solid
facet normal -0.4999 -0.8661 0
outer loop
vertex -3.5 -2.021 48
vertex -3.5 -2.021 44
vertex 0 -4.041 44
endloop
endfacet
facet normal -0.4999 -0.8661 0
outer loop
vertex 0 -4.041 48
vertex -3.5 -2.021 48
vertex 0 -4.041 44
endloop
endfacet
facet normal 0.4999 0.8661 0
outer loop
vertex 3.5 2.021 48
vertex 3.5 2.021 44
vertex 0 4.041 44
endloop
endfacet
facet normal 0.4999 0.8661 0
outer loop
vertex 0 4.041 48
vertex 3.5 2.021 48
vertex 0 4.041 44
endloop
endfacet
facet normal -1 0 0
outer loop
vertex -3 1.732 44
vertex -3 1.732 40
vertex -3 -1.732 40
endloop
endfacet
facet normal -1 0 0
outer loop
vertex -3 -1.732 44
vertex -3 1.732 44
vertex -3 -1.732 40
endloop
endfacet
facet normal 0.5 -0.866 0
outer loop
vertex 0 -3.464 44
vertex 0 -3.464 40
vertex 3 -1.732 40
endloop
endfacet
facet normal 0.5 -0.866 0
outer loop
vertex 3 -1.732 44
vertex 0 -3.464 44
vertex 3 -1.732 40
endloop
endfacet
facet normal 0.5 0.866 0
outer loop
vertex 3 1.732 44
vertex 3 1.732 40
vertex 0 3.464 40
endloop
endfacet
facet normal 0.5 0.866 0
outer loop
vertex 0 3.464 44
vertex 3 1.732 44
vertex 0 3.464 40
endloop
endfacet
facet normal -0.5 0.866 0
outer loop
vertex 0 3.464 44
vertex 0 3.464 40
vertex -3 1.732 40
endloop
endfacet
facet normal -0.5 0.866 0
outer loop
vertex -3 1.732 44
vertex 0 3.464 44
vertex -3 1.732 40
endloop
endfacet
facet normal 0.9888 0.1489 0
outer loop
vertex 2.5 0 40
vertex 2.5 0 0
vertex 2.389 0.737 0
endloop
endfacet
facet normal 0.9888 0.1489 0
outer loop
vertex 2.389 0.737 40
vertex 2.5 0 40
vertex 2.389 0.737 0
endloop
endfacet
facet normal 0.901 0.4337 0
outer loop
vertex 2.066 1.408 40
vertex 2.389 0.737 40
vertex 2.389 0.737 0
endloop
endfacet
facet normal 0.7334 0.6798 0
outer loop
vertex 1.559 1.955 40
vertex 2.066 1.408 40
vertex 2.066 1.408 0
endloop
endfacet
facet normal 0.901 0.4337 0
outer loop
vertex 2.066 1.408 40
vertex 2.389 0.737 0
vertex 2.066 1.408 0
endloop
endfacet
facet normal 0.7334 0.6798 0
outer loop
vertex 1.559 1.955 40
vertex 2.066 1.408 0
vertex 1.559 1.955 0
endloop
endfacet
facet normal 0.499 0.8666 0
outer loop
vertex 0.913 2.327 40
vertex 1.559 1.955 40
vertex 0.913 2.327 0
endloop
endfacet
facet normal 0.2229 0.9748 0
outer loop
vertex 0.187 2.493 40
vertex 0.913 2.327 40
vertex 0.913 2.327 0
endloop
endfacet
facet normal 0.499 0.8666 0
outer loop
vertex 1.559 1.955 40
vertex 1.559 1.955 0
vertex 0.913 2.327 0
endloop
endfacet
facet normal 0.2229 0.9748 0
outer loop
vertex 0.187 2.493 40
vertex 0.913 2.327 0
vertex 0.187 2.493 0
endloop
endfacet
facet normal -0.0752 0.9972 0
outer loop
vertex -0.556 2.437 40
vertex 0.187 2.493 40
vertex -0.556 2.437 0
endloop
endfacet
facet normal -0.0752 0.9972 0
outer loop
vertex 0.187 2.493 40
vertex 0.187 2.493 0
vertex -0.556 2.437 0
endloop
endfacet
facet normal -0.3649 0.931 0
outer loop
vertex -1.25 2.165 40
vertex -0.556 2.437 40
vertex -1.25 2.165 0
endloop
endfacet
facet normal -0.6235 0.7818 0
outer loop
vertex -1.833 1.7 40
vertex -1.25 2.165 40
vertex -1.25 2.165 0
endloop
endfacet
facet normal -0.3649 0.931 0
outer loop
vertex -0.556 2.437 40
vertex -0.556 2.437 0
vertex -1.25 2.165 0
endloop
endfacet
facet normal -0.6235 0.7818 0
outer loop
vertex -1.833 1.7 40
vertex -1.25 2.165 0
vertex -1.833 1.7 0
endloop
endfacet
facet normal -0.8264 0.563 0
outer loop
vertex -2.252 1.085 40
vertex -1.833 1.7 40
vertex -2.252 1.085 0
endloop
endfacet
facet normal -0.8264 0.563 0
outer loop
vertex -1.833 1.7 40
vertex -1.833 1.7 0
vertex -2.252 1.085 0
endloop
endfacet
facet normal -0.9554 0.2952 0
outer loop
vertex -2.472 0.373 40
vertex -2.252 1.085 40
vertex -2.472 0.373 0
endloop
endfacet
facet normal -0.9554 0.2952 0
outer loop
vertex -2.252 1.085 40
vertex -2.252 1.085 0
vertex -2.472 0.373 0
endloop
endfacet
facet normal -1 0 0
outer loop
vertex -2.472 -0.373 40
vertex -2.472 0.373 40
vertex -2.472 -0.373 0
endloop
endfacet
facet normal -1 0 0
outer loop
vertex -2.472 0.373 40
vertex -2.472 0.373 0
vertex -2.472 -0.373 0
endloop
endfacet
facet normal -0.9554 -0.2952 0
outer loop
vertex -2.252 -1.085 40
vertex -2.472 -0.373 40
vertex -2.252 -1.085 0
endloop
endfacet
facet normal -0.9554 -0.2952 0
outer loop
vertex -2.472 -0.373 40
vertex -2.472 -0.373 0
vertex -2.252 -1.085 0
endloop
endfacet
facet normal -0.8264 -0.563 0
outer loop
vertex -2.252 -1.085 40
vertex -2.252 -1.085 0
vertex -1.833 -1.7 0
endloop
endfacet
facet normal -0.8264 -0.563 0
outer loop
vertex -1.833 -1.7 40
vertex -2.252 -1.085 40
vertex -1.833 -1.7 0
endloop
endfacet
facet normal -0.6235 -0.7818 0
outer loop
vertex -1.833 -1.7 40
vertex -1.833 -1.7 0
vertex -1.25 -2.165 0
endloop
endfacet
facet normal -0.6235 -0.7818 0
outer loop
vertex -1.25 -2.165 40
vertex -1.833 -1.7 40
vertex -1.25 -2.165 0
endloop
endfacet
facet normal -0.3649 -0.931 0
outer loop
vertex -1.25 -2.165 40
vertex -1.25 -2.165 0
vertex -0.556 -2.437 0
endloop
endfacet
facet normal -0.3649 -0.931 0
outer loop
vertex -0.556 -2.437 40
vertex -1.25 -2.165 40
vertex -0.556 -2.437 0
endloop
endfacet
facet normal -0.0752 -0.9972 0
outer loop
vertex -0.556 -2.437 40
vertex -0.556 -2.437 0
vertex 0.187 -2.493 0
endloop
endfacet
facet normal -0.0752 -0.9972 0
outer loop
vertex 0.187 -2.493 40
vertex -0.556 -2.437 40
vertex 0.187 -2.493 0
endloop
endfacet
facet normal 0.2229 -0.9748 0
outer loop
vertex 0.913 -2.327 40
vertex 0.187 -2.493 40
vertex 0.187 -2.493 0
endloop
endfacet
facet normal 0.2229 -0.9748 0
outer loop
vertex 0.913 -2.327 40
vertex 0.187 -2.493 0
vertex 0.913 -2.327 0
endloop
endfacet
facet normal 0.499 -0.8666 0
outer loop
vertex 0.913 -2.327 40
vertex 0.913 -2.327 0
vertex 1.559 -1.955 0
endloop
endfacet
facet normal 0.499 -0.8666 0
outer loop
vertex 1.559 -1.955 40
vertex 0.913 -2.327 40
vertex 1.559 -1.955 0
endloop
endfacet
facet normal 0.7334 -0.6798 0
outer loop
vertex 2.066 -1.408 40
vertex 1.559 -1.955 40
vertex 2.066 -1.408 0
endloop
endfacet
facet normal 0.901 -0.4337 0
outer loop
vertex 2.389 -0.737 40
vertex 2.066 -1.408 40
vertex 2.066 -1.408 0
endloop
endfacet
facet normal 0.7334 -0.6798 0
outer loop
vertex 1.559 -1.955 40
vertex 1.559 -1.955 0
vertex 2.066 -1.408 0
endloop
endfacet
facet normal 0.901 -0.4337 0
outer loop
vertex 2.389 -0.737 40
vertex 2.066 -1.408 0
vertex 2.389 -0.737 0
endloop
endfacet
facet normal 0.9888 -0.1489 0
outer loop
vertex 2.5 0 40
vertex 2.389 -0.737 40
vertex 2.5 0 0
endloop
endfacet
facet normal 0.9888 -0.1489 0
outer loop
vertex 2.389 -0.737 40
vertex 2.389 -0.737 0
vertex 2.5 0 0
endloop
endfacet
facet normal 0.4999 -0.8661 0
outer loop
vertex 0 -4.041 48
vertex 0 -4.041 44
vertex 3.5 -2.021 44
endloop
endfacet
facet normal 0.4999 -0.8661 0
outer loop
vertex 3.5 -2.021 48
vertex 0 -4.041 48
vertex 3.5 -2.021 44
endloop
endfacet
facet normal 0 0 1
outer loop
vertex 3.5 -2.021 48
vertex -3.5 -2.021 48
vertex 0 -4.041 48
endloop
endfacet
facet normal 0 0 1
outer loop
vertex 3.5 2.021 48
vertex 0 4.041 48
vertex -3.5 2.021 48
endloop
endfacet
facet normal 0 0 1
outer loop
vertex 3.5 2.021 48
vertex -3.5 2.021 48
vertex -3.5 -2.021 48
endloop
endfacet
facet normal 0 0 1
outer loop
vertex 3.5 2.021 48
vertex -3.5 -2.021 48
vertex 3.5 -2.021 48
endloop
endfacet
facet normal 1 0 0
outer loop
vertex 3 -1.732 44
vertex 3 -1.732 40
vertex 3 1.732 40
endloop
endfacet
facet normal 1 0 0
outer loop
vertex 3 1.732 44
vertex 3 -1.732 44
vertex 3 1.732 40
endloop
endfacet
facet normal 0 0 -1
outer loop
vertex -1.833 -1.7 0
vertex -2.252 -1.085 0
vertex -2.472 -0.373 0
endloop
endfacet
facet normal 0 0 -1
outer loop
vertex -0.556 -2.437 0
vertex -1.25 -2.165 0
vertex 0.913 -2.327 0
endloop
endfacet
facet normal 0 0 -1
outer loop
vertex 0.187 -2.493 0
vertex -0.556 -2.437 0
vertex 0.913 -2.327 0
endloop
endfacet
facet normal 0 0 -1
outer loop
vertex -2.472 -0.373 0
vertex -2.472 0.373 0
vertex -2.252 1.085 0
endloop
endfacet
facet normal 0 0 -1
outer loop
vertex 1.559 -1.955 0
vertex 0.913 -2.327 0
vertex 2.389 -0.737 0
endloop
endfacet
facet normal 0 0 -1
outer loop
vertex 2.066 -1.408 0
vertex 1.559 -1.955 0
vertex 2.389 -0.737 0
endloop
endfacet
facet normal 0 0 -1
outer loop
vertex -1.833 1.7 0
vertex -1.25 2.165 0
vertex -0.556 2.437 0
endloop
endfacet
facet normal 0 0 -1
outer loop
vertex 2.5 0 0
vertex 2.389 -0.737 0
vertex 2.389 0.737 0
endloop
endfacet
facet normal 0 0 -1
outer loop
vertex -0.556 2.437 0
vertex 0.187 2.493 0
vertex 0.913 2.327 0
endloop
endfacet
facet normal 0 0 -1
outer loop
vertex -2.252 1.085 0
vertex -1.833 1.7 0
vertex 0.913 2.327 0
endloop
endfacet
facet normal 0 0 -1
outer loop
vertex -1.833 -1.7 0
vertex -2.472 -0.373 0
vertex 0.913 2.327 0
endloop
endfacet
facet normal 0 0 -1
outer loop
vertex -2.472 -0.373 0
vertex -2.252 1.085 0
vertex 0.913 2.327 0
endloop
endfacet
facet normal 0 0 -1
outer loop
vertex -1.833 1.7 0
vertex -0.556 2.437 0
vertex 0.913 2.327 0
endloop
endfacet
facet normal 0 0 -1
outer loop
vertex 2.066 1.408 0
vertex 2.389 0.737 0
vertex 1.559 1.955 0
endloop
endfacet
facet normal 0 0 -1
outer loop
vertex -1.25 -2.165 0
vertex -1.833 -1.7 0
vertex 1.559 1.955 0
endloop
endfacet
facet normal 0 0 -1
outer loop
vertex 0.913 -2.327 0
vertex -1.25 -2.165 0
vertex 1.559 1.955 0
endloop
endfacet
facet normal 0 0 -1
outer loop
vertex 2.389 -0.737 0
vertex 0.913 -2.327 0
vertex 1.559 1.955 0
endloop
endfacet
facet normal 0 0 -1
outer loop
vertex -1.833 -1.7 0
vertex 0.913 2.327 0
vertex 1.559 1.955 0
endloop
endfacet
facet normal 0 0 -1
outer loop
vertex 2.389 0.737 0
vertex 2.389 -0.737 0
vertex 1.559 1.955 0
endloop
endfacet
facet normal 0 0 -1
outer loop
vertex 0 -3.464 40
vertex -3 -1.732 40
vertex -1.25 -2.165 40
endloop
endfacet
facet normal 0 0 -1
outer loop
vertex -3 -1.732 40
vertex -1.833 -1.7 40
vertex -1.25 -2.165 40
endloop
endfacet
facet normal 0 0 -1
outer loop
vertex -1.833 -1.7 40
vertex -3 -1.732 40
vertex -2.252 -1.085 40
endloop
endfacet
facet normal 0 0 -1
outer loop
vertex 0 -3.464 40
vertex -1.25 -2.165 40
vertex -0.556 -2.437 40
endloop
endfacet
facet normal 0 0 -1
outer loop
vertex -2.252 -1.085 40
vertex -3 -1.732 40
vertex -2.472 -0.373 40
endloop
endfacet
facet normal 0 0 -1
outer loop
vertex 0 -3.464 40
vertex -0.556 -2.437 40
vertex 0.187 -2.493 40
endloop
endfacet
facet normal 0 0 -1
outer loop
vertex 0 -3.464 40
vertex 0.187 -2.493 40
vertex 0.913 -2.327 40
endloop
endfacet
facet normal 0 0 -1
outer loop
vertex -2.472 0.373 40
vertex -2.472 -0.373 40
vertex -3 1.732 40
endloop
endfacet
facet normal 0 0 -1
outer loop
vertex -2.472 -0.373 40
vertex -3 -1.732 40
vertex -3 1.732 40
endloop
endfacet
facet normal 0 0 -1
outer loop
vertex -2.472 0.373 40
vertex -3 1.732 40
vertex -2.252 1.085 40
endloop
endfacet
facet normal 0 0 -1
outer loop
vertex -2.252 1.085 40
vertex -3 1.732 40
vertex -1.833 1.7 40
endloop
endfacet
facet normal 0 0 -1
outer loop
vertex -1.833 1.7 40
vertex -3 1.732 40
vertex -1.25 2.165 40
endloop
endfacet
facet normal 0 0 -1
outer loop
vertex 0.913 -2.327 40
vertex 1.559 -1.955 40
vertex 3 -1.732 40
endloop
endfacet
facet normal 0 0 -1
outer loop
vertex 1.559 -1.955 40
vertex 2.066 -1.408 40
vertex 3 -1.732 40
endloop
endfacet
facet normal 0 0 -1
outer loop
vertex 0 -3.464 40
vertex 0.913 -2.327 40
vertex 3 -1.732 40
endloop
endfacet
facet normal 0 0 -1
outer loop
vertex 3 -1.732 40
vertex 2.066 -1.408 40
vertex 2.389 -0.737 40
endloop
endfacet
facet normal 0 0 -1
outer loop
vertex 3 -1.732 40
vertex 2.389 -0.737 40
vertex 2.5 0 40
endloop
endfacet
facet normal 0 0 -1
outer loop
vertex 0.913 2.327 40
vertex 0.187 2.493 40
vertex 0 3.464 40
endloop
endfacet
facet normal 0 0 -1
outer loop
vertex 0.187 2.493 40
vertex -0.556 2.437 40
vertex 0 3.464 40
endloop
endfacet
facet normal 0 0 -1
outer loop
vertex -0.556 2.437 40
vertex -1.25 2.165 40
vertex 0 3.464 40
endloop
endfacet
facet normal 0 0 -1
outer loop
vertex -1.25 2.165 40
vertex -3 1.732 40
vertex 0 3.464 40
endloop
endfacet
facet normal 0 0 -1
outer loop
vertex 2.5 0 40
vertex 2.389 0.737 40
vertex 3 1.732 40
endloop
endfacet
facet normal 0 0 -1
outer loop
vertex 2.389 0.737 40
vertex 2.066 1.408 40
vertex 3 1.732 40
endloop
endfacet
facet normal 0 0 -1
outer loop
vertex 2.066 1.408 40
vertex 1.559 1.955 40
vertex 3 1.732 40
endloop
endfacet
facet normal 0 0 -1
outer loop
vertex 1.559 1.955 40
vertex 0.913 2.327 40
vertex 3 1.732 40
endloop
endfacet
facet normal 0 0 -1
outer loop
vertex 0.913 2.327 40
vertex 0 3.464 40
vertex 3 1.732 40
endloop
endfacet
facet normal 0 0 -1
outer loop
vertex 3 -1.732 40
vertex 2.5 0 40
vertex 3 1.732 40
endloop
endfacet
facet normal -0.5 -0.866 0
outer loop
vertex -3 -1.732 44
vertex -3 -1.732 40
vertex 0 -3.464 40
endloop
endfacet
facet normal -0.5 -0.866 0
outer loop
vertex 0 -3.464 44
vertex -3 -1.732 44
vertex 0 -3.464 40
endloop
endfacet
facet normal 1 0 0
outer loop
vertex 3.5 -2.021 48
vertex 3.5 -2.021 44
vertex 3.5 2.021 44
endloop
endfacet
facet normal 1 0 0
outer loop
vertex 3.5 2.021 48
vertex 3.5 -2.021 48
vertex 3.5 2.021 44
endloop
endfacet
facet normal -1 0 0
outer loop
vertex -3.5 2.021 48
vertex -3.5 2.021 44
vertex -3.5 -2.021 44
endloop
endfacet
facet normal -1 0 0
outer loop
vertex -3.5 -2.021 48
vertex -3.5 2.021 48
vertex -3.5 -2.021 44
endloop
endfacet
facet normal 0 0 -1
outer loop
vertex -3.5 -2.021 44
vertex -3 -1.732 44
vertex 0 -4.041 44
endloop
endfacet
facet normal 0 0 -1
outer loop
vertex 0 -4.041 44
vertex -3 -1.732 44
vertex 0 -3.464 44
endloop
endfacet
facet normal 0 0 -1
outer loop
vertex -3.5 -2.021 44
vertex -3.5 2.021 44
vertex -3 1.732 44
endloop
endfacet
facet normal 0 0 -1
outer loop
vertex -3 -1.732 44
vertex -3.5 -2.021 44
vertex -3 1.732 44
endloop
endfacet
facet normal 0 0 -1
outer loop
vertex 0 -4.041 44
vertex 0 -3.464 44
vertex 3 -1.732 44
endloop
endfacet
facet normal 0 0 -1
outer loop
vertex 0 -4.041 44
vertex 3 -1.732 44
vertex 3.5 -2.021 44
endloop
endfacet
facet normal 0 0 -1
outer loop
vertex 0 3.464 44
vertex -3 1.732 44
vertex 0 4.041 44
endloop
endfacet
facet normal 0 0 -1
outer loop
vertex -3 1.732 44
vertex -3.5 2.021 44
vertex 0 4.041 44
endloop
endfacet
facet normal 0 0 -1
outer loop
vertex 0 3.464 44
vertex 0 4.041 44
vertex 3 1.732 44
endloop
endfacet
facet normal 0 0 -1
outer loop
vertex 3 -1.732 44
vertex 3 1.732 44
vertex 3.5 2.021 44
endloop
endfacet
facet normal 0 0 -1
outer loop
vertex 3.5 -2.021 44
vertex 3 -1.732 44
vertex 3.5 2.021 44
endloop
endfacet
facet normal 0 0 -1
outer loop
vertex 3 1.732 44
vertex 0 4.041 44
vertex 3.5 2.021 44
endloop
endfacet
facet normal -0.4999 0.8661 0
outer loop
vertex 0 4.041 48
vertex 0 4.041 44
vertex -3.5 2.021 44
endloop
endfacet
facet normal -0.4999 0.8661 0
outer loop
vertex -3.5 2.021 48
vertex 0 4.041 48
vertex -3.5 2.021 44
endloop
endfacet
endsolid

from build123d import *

# Parameters (mm, degrees)
F0_R     = 2.5
F1_DEPTH = 40
F3_DEPTH = 4
F5_DEPTH = 4


with BuildPart() as f1:
    # F0 (on Top) → F1 (new body)
    with BuildSketch(Plane.XY):
        Circle(F0_R)
    extrude(amount=F1_DEPTH)

    # F2 (on face) → F3 (join)
    with BuildSketch(Plane.XY.offset(40)):
        Polygon((3, -1.732051), (3, 1.732051), (0, 3.464102), (-3, 1.732051), (-3, -1.732051), (0, -3.464102), align=None)
    extrude(amount=F3_DEPTH)

    # F4 (on face) → F5 (join)
    with BuildSketch(Plane.XY.offset(44)):
        Polygon((3.5, -2.020726), (3.5, 2.020726), (0, 4.041452), (-3.5, 2.020726), (-3.5, -2.020726), (0, -4.041452), align=None)
    extrude(amount=F5_DEPTH)


solid = f1.part
